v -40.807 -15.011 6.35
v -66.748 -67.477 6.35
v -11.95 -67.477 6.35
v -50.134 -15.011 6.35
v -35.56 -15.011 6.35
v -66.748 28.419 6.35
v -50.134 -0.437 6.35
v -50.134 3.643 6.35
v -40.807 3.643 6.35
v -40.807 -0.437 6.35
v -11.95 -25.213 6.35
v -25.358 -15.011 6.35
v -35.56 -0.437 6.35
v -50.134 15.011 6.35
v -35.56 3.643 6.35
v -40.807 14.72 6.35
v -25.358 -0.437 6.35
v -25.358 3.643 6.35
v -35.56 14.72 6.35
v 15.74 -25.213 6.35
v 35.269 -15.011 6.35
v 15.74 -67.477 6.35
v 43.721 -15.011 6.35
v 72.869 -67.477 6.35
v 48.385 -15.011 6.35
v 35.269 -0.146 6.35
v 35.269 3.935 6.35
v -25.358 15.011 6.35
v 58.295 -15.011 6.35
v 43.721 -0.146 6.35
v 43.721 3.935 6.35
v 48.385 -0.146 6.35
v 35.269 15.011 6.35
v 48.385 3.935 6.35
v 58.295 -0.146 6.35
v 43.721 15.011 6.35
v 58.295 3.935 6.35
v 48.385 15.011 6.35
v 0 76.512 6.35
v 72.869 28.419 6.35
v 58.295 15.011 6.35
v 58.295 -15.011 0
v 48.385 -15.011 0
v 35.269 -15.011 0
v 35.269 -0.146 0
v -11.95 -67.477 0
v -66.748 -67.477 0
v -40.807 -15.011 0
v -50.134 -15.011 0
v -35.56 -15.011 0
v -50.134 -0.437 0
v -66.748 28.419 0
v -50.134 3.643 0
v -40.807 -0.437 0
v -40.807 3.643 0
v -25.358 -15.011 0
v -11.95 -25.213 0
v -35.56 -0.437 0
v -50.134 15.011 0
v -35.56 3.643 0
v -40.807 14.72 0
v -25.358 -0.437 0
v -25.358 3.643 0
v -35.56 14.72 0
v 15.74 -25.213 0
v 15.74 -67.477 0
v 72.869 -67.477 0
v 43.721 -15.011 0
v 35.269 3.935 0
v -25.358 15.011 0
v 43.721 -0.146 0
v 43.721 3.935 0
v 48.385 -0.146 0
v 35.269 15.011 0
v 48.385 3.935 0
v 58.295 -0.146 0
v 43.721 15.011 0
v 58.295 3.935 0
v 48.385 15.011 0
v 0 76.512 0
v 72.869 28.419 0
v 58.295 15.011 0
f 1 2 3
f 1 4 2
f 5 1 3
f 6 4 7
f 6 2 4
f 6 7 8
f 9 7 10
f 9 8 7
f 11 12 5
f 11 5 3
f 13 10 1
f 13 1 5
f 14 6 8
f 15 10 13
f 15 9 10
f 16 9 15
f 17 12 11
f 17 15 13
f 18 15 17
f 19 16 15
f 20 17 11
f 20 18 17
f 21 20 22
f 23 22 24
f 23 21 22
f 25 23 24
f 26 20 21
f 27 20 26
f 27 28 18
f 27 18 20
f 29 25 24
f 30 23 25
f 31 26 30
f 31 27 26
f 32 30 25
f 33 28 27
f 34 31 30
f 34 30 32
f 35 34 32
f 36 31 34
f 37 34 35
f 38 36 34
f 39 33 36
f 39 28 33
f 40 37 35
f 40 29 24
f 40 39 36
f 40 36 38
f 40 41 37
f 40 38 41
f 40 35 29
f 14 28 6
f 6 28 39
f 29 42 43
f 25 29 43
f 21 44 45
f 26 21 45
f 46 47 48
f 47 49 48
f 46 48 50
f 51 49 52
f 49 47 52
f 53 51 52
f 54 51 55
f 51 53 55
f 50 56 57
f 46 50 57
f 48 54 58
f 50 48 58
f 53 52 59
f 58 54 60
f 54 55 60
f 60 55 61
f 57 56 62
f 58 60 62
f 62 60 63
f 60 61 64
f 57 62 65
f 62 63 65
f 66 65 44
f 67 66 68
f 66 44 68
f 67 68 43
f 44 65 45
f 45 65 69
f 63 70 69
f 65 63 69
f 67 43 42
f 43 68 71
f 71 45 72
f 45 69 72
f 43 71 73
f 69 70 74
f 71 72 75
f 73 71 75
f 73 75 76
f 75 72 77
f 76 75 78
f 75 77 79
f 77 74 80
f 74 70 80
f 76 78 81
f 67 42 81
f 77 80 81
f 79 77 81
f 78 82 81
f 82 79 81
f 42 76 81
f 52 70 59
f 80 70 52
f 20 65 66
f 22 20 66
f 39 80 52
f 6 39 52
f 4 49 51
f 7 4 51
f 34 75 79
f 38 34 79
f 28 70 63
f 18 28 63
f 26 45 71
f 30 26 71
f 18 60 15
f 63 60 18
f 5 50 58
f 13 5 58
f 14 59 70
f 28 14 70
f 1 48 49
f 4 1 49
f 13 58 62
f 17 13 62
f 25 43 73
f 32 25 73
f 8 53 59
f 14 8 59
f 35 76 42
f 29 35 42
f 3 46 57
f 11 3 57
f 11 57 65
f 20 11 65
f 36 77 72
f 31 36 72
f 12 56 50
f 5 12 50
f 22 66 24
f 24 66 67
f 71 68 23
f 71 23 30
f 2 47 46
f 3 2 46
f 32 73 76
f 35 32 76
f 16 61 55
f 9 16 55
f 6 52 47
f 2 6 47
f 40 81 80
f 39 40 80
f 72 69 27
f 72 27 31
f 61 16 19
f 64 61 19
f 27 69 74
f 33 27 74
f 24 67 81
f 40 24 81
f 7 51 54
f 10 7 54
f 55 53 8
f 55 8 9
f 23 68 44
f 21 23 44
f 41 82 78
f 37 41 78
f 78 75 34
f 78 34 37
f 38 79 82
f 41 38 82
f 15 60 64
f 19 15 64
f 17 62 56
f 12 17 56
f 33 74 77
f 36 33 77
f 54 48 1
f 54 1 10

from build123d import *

# Parameters (mm, degrees)
F1_DEPTH = 6.35
F2_W     = 4.6636089683
F2_H     = 11.6590159014
F2_H_2   = 4.0806564502
F2_W_2   = 10.2016367018
F2_W_3   = 10.7845924795
F2_H_3   = 15.7396723516
F3_DEPTH = 6.35
F4_W     = 5.2465572953
F4_H     = 11.0760659445
F4_H_2   = 4.0806552861
F4_W_2   = 11.076066643
F4_W_3   = 10.4931145906
F4_H_3   = 15.1567212306
F5_DEPTH = 6.35


with BuildPart() as f1:
    # F0 (on Top) → F1 (new body)
    with BuildSketch(Plane.XY):
        Polygon((72.8688538074, 28.418853879), (-66.7478665709, 28.418853879), (-66.7478665709, -67.4765557051), (-11.9504919276, -67.4765557051), (-11.9504919276, -25.212623179), (15.7396737486, -25.212623179), (15.7396737486, -67.4765557051), (72.8688538074, -67.4765557051), align=None)
        Polygon((-50.1337721944, 0), (-50.1337721944, 15.0109836832), (-37.7460662276, 15.0109836832), (-25.3583602607, 15.0109836832), (-25.3583602607, 0), (-25.3583602607, -15.0109836832), (-37.7460662276, -15.0109836832), (-50.1337721944, -15.0109836832), align=None, mode=Mode.SUBTRACT)
        Polygon((35.2685265243, 0), (35.2685265243, 15.0109836832), (46.7818062752, 15.0109836832), (58.2950860262, 15.0109836832), (58.2950860262, 0), (58.2950860262, -15.0109836832), (46.7818062752, -15.0109836832), (35.2685265243, -15.0109836832), align=None, mode=Mode.SUBTRACT)
        Polygon((0, 76.5122994781), (-66.7478665709, 28.418853879), (72.8688538074, 28.418853879), align=None)
    extrude(amount=F1_DEPTH)

    # F2 (on Top) → F3 (join)
    with BuildSketch(Plane.XY):
        with Locations((46.0531152785, 9.7644259222)):
            Rectangle(F2_W, F2_H)
        with Locations((46.0531152785, 1.8945897464)):
            Rectangle(F2_W, F2_H_2)
        with Locations((38.6204924434, 1.8945897464)):
            Rectangle(F2_W_2, F2_H_2)
        with Locations((53.7772160023, 1.8945897464)):
            Rectangle(F2_W_3, F2_H_2)
        with Locations((46.0531152785, -8.0155746546)):
            Rectangle(F2_W, F2_H_3)
    extrude(amount=F3_DEPTH)

    # F4 (on Top) → F5 (join)
    with BuildSketch(Plane.XY):
        with Locations((-38.1832793355, 9.1814756161)):
            Rectangle(F4_W, F4_H)
        with Locations((-38.1832793355, 1.6031150008)):
            Rectangle(F4_W, F4_H_2)
        with Locations((-46.3445913047, 1.6031150008)):
            Rectangle(F4_W_2, F4_H_2)
        with Locations((-30.3134433925, 1.6031150008)):
            Rectangle(F4_W_3, F4_H_2)
        with Locations((-38.1832793355, -8.0155732576)):
            Rectangle(F4_W, F4_H_3)
    extrude(amount=F5_DEPTH)


solid = f1.part
